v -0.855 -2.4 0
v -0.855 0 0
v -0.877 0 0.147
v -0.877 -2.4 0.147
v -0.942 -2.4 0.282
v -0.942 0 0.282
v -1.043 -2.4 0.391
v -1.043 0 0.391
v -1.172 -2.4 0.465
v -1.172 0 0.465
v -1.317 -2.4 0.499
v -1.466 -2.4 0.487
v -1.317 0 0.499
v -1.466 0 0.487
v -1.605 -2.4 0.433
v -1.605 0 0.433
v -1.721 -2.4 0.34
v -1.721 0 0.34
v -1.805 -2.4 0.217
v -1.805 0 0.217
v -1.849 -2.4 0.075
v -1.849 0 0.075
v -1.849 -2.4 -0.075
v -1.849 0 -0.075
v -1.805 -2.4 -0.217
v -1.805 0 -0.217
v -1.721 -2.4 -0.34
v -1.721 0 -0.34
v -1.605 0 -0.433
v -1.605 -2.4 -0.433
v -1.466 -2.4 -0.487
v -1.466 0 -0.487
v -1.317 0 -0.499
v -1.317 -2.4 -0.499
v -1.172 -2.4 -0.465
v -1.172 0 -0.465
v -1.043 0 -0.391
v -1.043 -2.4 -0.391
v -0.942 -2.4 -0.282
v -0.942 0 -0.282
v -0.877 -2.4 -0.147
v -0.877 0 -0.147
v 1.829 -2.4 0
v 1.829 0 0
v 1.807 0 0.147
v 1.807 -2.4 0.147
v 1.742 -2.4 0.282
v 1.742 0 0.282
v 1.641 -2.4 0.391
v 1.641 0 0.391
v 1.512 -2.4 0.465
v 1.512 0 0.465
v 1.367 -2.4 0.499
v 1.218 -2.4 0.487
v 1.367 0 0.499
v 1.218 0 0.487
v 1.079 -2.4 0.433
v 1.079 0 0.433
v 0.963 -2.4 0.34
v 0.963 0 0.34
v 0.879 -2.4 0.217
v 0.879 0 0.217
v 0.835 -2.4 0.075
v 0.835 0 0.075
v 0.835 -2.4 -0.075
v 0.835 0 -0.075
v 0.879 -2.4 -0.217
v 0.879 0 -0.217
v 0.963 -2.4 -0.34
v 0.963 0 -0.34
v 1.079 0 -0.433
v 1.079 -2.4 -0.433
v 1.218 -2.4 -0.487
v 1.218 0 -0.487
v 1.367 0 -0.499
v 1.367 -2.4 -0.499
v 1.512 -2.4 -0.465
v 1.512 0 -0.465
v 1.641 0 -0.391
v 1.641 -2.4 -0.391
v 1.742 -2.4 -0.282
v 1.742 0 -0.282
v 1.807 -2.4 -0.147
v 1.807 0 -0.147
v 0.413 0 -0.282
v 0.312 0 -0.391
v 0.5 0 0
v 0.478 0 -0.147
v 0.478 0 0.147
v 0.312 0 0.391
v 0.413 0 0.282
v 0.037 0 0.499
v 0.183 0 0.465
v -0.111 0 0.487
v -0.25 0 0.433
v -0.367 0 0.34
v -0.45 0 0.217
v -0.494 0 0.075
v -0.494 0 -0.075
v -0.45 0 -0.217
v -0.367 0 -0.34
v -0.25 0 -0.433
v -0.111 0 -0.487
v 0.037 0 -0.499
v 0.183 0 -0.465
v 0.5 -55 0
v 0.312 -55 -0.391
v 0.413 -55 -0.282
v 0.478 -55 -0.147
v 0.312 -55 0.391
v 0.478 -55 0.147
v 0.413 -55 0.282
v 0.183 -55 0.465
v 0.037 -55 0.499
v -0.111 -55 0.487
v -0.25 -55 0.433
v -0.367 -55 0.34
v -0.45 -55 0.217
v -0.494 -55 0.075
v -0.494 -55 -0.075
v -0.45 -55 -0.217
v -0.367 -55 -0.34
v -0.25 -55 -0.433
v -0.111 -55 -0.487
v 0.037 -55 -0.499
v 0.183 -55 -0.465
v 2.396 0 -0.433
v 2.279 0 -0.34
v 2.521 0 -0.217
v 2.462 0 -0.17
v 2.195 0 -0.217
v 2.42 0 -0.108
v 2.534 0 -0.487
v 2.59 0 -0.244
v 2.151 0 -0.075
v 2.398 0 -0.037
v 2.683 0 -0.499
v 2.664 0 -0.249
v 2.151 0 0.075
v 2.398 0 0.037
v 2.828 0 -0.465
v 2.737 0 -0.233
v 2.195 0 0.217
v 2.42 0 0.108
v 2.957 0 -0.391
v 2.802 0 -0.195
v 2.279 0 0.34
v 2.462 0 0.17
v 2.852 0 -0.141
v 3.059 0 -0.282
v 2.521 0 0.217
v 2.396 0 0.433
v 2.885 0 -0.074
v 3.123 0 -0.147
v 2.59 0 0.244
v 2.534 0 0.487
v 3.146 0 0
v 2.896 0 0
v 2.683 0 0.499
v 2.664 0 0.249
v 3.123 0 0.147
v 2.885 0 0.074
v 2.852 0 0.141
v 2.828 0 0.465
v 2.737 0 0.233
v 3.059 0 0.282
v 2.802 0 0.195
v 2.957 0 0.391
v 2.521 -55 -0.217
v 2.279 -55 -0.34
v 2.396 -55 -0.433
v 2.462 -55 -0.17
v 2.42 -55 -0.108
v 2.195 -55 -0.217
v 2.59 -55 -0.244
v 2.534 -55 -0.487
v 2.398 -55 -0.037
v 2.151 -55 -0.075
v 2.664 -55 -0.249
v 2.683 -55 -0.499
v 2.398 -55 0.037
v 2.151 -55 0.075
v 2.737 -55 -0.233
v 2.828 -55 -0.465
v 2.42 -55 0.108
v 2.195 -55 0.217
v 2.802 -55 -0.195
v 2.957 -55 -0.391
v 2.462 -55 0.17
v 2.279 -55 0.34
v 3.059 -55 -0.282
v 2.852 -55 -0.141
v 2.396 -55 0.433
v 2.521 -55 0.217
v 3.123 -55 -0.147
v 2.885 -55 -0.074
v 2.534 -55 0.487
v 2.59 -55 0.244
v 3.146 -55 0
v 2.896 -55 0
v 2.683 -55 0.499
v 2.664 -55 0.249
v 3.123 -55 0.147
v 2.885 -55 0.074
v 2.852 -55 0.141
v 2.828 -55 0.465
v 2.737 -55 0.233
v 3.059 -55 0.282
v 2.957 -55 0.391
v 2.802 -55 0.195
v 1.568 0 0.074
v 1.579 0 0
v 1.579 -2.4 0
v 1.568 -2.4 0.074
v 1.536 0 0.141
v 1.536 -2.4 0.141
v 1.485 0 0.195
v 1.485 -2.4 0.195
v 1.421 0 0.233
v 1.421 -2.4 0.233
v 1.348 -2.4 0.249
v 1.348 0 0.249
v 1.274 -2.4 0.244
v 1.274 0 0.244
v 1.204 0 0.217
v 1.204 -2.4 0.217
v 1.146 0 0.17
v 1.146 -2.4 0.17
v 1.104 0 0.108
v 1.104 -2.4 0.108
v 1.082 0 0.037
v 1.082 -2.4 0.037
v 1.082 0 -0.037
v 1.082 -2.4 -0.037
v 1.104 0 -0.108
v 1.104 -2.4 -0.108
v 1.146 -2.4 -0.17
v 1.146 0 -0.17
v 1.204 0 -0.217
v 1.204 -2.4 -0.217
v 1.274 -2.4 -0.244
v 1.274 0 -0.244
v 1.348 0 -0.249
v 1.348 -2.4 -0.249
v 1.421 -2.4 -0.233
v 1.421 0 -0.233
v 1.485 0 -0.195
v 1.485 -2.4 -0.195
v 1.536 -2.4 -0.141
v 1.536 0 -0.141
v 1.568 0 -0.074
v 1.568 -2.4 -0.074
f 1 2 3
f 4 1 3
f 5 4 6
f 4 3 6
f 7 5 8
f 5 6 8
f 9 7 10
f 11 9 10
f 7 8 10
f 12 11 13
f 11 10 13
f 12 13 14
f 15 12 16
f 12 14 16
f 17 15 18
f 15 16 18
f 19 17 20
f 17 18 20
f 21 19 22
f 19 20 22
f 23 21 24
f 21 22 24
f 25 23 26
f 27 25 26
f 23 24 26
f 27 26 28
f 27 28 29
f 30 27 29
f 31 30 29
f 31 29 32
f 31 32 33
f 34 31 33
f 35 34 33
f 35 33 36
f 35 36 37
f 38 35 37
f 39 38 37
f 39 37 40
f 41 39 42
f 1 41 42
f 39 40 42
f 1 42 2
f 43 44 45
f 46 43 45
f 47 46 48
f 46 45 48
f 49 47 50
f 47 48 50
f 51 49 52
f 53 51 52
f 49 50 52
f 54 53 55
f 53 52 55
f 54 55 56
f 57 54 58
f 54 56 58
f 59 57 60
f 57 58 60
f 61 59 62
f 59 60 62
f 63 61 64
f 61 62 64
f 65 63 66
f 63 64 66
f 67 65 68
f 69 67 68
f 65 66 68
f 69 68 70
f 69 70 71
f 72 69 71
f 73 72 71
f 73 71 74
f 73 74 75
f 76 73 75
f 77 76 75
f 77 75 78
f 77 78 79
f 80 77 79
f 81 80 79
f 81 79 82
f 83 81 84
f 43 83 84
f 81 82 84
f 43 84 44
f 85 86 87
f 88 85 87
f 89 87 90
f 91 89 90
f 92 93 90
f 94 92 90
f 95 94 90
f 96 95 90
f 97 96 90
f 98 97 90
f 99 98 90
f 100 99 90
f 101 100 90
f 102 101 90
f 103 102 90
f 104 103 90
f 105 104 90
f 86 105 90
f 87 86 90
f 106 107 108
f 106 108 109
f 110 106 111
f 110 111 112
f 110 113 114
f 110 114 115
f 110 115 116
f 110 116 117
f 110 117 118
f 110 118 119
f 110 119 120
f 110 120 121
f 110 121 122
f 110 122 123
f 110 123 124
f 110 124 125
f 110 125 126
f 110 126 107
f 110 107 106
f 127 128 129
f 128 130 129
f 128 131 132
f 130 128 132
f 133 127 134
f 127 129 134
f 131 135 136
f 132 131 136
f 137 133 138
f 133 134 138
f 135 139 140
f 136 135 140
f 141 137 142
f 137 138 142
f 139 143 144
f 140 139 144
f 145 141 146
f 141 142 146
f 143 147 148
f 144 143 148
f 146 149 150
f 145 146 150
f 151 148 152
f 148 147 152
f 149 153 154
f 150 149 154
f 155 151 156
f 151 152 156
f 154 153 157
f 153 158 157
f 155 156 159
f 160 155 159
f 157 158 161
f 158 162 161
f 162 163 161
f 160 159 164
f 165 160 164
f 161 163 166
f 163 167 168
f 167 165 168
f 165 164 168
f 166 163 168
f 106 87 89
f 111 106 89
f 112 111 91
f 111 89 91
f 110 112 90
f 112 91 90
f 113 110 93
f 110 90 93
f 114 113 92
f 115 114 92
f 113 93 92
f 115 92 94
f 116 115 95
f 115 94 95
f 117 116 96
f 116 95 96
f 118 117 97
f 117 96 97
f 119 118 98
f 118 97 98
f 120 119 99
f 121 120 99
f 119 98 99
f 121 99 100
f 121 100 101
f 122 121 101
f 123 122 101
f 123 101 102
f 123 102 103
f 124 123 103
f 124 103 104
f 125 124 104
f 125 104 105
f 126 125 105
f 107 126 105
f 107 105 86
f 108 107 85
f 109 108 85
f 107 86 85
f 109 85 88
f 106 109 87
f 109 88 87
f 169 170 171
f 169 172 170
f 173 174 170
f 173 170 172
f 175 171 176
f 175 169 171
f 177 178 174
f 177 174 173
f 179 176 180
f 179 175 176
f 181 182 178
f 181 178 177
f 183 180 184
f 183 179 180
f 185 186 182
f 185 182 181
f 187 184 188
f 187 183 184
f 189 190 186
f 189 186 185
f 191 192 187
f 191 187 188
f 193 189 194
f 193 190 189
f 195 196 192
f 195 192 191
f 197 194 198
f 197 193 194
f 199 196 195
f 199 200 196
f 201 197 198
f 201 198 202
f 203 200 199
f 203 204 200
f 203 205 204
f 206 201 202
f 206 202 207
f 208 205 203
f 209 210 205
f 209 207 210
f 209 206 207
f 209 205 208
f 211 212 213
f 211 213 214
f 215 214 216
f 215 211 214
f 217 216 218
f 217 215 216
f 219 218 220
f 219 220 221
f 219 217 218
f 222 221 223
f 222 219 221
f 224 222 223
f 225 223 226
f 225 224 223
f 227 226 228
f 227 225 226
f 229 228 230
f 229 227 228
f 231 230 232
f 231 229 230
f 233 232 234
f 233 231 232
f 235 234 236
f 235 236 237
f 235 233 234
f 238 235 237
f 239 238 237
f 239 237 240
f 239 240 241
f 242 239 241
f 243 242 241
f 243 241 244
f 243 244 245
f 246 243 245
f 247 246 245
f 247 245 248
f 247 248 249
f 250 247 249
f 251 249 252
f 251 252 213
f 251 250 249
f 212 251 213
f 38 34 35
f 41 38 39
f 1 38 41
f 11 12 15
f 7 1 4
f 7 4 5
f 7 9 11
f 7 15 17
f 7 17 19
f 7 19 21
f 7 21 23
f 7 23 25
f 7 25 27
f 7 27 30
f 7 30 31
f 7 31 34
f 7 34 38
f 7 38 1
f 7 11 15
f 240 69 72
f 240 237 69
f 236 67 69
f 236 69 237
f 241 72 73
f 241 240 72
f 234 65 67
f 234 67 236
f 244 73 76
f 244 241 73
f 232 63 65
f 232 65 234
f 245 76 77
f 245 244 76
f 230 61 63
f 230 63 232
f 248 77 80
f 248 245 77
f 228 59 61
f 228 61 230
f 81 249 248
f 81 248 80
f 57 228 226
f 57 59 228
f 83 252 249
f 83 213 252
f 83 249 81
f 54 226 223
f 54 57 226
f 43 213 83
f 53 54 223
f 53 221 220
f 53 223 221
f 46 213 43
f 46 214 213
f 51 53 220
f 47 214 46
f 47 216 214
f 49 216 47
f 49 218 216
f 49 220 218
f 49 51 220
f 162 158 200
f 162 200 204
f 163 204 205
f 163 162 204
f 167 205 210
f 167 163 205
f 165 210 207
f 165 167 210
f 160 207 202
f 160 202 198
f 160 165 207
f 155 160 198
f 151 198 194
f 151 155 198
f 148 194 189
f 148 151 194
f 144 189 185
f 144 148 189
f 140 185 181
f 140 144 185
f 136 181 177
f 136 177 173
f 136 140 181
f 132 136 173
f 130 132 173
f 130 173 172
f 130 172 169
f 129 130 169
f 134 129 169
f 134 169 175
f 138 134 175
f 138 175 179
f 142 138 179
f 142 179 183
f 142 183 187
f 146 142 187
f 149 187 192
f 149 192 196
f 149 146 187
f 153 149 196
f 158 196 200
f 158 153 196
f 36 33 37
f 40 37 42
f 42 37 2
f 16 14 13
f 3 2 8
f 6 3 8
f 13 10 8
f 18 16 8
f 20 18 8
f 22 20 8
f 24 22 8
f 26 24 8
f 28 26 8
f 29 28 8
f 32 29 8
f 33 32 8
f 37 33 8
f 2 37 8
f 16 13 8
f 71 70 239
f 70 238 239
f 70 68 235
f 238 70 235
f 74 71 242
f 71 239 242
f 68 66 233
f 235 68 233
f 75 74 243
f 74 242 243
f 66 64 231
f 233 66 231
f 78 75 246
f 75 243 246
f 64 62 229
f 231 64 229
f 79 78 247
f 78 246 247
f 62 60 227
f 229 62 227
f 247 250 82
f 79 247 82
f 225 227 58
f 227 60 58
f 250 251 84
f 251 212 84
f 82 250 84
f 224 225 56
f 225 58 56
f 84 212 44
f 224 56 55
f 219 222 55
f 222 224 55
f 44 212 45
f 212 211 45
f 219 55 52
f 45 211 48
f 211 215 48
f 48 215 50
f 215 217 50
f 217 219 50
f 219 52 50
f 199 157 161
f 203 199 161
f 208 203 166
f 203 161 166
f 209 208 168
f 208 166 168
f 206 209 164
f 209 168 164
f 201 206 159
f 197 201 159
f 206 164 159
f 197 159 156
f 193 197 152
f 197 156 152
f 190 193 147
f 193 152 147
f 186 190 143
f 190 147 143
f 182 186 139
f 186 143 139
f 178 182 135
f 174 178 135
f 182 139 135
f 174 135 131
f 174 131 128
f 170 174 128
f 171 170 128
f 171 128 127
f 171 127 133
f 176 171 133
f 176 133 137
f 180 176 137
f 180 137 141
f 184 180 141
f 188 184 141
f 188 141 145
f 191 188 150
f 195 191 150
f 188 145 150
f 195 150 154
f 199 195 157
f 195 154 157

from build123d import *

# Parameters (mm, degrees)
F0_R     = 0.5
F1_DEPTH = 2.4
F2_DEPTH = 55
F0_R_2   = 0.25
F3_DEPTH = 2.4
F4_DEPTH = 55


with BuildPart() as f1:
    # F0 (on Front) → F1 (new body)
    with BuildSketch(Plane.XZ):
        with Locations((-1.354773, 0)):
            Circle(F0_R)
    extrude(amount=F1_DEPTH)


with BuildPart() as f2:
    # F0 (on Front) → F2 (new body)
    with BuildSketch(Plane.XZ):
        Circle(F0_R)
    extrude(amount=F2_DEPTH)


with BuildPart() as f3:
    # F0 (on Front) → F3 (new body)
    with BuildSketch(Plane.XZ):
        with Locations((1.329211, 0)):
            Circle(F0_R)
        with Locations((1.329211, 0)):
            Circle(F0_R_2, mode=Mode.SUBTRACT)
    extrude(amount=F3_DEPTH)


with BuildPart() as f4:
    # F0 (on Front) → F4 (new body)
    with BuildSketch(Plane.XZ):
        with Locations((2.645641, 0)):
            Circle(F0_R)
        with Locations((2.645641, 0)):
            Circle(F0_R_2, mode=Mode.SUBTRACT)
    extrude(amount=F4_DEPTH)


solid = Compound([f1.part, f2.part, f3.part, f4.part])
